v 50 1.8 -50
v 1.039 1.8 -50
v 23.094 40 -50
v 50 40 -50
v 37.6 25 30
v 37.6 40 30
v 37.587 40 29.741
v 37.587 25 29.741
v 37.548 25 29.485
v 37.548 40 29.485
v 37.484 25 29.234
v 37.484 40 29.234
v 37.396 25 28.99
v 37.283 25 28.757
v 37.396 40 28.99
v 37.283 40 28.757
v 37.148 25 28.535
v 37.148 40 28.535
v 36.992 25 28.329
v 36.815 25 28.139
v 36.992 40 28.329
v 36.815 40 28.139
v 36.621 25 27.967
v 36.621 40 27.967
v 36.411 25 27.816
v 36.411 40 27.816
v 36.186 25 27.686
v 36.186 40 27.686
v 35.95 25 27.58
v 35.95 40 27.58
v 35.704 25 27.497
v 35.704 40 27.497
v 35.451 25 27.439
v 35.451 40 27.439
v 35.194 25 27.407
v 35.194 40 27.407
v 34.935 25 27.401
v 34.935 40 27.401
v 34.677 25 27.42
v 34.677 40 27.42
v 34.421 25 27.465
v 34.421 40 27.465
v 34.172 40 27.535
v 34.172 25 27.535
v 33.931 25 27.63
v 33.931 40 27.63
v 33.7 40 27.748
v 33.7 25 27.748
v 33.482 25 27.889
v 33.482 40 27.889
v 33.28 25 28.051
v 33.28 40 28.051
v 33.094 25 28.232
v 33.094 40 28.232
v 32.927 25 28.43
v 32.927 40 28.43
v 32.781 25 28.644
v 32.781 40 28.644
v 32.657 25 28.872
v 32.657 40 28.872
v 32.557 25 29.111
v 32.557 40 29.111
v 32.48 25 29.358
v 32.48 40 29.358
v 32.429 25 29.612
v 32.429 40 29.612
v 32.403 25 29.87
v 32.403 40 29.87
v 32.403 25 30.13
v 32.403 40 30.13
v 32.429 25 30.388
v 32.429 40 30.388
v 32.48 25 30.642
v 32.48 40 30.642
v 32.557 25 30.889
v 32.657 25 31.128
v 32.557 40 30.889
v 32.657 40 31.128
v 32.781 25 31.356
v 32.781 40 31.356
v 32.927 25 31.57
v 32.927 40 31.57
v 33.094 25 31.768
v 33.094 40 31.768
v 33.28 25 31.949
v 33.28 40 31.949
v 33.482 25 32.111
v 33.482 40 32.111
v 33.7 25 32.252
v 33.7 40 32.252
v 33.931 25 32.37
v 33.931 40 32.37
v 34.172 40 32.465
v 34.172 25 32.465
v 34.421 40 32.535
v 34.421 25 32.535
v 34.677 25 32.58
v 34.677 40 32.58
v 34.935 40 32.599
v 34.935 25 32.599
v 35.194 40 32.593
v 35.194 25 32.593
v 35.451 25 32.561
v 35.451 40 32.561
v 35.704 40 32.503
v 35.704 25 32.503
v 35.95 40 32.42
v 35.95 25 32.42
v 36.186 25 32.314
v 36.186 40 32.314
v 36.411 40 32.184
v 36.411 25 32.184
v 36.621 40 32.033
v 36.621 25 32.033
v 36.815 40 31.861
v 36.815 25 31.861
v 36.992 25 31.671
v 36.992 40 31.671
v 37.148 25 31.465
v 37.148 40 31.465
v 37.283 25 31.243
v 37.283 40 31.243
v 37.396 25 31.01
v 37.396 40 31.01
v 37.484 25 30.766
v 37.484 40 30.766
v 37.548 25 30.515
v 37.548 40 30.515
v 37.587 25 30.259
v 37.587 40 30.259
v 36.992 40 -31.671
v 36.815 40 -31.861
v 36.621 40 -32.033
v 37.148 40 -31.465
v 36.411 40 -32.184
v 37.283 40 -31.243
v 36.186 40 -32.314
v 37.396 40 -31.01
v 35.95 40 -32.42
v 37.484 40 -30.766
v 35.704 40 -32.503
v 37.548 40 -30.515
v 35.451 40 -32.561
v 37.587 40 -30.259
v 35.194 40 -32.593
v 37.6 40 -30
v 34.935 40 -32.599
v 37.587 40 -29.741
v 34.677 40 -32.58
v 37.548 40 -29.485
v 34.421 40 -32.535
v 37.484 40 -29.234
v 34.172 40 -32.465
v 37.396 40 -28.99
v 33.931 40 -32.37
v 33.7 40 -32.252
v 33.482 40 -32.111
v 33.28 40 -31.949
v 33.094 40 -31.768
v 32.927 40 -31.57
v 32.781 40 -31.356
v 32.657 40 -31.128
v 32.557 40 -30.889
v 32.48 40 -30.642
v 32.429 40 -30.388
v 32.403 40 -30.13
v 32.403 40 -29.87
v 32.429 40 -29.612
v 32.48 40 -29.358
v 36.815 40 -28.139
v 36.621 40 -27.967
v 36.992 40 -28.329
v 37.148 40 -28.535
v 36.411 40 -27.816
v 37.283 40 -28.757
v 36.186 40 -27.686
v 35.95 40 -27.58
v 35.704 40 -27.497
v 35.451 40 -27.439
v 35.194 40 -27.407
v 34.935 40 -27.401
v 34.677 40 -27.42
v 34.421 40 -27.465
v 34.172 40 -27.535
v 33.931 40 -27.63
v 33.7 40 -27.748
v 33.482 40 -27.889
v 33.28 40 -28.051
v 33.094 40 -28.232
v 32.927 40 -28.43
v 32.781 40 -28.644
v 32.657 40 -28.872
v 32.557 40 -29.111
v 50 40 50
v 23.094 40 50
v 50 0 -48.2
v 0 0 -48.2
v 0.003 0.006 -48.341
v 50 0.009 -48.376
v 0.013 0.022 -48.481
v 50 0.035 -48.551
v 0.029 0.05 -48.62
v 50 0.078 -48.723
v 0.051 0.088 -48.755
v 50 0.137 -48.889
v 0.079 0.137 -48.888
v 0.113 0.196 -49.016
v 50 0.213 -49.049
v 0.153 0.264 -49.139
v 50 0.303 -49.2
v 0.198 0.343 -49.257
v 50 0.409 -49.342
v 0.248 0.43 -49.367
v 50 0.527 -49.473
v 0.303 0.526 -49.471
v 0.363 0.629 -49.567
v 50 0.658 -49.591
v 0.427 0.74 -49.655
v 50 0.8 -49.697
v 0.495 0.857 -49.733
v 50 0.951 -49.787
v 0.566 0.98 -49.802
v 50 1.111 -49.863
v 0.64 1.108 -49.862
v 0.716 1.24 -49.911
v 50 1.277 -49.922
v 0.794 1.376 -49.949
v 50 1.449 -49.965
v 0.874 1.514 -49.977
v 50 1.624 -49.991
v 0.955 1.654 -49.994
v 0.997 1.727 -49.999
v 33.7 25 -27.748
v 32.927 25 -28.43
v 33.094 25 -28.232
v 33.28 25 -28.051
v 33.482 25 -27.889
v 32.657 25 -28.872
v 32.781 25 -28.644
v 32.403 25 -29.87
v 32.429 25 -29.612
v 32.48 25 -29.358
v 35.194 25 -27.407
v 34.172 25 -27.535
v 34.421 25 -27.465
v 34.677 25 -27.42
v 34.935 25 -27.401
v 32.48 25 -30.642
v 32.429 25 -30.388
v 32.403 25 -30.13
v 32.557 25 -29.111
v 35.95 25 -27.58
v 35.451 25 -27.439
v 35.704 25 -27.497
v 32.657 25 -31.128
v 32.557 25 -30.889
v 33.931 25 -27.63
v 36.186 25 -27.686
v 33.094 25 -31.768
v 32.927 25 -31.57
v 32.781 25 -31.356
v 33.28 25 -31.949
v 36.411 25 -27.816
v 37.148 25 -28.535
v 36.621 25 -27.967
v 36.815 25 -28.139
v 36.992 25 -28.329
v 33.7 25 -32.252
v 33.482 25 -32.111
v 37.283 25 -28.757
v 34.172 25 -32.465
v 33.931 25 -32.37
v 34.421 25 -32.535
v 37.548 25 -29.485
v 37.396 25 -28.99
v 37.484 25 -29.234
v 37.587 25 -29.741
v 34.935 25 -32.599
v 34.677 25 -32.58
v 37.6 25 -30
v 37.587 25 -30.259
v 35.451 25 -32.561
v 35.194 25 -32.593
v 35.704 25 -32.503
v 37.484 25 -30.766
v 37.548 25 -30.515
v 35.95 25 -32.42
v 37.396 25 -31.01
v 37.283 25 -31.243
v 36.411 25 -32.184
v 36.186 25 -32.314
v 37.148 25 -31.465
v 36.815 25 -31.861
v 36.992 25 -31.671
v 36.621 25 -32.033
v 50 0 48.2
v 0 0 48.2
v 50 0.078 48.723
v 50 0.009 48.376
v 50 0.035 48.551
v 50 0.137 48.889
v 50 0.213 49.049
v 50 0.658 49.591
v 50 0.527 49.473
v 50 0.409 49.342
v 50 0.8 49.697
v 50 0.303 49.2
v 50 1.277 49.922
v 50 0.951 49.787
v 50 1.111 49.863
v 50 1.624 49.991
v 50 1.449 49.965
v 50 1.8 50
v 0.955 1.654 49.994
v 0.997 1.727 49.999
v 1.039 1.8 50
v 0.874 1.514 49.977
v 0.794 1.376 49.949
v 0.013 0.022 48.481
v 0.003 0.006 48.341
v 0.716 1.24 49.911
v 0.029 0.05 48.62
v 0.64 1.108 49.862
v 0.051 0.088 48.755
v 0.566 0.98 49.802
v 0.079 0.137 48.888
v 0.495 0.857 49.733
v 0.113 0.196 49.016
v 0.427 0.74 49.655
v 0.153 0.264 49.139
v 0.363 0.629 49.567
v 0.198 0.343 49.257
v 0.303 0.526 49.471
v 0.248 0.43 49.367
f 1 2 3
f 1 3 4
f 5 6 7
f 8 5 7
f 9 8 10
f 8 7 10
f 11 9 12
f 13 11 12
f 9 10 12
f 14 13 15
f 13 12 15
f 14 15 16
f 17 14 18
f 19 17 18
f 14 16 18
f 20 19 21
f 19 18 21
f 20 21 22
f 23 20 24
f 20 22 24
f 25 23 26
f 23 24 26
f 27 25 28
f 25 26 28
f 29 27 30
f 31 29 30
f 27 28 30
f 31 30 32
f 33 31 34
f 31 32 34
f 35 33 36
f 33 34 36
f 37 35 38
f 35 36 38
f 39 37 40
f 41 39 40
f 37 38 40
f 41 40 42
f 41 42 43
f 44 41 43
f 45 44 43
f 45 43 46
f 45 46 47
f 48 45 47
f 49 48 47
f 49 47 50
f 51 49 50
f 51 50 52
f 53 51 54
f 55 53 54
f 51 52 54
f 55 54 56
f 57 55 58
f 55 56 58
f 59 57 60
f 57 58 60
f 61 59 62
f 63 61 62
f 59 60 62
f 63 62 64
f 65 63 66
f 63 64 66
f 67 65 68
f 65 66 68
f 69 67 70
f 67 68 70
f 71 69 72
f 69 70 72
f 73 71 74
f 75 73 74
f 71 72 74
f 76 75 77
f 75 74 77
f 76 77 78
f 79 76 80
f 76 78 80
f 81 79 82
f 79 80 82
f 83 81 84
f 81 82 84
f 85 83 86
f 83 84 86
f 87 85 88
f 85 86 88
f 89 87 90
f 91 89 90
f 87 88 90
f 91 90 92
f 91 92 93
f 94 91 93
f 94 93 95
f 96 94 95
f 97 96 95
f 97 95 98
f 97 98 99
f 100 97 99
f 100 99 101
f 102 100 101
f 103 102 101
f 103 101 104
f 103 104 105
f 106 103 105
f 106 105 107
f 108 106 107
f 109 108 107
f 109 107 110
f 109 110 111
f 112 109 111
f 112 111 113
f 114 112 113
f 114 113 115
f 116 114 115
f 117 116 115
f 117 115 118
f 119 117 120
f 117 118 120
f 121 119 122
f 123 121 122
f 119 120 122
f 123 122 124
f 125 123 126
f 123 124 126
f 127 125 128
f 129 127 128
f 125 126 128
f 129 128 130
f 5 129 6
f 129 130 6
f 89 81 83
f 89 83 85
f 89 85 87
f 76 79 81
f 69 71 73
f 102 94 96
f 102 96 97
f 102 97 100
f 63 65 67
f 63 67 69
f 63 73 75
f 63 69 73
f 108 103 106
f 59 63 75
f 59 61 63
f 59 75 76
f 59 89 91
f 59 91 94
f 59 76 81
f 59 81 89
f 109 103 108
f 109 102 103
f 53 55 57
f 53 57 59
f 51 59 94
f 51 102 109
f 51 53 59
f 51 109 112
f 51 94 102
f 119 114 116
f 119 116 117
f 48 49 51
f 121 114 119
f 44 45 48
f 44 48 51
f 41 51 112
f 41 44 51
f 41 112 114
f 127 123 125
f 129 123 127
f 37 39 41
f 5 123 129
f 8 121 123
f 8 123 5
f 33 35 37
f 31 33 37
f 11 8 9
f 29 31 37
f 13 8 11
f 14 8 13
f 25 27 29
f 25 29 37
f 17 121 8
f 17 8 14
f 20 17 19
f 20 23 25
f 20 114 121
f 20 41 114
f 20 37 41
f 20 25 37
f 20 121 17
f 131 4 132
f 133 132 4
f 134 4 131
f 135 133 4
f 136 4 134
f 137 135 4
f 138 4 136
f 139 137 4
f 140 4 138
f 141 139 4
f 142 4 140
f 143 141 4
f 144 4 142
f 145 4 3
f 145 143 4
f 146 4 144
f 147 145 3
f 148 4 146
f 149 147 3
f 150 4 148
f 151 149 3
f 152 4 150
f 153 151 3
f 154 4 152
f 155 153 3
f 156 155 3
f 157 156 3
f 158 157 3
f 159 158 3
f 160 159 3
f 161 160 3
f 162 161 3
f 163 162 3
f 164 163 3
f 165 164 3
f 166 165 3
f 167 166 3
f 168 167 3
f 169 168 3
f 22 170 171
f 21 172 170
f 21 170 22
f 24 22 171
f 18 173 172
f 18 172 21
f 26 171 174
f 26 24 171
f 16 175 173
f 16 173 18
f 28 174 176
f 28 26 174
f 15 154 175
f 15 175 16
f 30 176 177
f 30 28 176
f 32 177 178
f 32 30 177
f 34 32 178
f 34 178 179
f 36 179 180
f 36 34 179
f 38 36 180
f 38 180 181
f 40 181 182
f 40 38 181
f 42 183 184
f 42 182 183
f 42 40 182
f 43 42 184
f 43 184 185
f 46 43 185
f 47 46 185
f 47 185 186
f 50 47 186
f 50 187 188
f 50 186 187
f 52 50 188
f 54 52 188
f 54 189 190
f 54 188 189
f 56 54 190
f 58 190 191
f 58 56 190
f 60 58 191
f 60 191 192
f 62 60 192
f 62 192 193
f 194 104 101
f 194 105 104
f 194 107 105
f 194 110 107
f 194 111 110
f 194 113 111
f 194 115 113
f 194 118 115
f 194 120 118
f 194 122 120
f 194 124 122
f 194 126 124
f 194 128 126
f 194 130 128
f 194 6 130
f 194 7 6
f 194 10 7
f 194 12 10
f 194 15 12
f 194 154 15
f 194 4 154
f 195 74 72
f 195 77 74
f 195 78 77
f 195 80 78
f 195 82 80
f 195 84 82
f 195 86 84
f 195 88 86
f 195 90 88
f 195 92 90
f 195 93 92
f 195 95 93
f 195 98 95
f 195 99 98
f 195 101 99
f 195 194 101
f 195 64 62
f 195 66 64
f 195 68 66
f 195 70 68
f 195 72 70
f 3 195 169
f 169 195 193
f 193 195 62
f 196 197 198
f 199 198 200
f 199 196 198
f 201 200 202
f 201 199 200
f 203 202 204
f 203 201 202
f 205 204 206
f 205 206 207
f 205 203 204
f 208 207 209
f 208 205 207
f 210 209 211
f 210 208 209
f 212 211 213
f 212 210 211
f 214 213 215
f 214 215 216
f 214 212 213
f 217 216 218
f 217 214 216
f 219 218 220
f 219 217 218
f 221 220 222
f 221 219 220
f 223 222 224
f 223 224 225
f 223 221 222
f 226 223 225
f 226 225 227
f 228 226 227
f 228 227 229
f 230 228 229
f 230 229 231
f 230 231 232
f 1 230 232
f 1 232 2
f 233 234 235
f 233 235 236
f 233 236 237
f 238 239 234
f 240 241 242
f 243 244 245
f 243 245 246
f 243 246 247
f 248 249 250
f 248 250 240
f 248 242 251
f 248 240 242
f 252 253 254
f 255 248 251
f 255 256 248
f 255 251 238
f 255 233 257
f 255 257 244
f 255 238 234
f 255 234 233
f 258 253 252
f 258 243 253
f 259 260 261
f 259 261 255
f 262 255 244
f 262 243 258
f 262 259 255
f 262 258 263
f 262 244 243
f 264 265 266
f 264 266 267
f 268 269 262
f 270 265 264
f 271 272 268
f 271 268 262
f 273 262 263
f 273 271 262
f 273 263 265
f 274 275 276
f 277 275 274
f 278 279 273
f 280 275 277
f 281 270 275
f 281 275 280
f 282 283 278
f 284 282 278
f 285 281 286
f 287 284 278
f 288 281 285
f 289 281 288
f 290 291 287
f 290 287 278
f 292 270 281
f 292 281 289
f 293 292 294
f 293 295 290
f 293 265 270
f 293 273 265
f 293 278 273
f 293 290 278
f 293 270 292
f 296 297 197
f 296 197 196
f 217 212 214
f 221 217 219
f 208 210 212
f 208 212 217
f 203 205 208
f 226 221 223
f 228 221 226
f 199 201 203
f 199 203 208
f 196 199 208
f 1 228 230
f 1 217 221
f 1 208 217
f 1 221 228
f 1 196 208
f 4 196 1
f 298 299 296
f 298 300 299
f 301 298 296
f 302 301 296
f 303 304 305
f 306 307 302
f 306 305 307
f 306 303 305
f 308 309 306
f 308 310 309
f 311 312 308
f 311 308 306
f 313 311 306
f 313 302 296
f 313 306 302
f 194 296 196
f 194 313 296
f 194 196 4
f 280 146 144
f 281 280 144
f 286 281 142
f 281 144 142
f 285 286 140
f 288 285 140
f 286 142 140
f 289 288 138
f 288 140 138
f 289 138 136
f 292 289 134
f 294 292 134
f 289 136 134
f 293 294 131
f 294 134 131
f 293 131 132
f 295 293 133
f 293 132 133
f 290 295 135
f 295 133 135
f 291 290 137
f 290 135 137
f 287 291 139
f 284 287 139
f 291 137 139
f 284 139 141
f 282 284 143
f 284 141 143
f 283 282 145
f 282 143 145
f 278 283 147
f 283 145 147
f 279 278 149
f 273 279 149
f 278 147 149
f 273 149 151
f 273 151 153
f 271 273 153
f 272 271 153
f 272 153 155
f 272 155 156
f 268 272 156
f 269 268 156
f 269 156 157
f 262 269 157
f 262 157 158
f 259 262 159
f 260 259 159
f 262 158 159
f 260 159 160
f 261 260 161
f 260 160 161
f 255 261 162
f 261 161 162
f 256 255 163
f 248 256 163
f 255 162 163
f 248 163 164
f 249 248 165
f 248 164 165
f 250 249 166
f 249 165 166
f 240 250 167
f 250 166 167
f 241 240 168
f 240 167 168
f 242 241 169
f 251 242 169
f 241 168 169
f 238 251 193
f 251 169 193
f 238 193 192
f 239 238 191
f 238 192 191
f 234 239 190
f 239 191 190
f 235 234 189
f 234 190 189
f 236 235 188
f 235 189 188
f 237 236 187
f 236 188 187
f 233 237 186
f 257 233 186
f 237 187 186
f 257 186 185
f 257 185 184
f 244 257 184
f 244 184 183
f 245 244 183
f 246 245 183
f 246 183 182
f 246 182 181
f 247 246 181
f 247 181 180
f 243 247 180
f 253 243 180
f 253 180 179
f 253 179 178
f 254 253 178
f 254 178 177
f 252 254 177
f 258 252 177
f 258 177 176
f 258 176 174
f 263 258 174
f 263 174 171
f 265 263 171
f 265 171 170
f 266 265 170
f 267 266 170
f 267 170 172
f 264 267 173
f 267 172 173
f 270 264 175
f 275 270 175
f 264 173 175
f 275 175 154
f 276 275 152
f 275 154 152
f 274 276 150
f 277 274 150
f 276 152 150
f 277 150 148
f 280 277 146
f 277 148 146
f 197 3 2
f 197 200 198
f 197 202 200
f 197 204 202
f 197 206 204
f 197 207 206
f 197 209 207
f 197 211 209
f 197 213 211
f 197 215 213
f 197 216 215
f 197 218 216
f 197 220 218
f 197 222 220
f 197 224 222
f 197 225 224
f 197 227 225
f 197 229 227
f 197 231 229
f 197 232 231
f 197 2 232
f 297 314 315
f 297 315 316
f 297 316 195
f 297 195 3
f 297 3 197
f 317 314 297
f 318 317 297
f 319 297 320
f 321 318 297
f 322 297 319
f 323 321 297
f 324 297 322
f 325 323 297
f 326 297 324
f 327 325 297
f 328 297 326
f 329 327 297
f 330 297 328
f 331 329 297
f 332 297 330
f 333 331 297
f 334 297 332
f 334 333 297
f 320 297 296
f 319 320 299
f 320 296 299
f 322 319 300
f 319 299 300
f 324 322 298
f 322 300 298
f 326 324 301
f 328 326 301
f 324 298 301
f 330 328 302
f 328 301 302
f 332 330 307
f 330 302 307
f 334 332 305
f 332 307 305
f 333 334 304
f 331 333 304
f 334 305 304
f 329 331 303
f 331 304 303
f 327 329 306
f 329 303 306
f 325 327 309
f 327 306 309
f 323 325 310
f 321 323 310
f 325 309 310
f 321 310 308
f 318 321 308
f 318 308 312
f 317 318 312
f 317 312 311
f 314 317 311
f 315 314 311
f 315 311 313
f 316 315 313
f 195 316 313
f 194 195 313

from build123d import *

# Parameters (mm, degrees)
BOSS_EXTRUDE1_DEPTH = 50
SKETCH3_R           = 2.6
CUT_EXTRUDE2_DEPTH  = 15
FILLET2_R           = 1.8
FILLET3_R           = 1.8


with BuildPart() as part:
    # Sketch1 → Boss-Extrude1 (new body, symmetric)
    with BuildSketch(Plane.XY):
        Polygon((0, 0), (50, 0), (50, 40), (23.094010768, 40), align=None)
    extrude(amount=BOSS_EXTRUDE1_DEPTH, both=True)

    # Sketch3 → Cut-Extrude2 (cut)
    with BuildSketch(Plane(origin=(0, 40, 0), x_dir=(1, 0, 0), z_dir=(0, 1, 0))):
        with Locations((35, 30)):
            Circle(SKETCH3_R)
        with Locations((35, -30)):
            Circle(SKETCH3_R)
    extrude(amount=-CUT_EXTRUDE2_DEPTH, mode=Mode.SUBTRACT)

    # Fillet2
    fillet2_edges = [part.edges().sort_by_distance(p)[0] for p in [
        (25, 0, 50),
    ]]
    fillet(fillet2_edges, radius=FILLET2_R)

    # Fillet3
    fillet3_edges = [part.edges().sort_by_distance(p)[0] for p in [
        (25, 0, -50),
    ]]
    fillet(fillet3_edges, radius=FILLET3_R)


solid = part.part
